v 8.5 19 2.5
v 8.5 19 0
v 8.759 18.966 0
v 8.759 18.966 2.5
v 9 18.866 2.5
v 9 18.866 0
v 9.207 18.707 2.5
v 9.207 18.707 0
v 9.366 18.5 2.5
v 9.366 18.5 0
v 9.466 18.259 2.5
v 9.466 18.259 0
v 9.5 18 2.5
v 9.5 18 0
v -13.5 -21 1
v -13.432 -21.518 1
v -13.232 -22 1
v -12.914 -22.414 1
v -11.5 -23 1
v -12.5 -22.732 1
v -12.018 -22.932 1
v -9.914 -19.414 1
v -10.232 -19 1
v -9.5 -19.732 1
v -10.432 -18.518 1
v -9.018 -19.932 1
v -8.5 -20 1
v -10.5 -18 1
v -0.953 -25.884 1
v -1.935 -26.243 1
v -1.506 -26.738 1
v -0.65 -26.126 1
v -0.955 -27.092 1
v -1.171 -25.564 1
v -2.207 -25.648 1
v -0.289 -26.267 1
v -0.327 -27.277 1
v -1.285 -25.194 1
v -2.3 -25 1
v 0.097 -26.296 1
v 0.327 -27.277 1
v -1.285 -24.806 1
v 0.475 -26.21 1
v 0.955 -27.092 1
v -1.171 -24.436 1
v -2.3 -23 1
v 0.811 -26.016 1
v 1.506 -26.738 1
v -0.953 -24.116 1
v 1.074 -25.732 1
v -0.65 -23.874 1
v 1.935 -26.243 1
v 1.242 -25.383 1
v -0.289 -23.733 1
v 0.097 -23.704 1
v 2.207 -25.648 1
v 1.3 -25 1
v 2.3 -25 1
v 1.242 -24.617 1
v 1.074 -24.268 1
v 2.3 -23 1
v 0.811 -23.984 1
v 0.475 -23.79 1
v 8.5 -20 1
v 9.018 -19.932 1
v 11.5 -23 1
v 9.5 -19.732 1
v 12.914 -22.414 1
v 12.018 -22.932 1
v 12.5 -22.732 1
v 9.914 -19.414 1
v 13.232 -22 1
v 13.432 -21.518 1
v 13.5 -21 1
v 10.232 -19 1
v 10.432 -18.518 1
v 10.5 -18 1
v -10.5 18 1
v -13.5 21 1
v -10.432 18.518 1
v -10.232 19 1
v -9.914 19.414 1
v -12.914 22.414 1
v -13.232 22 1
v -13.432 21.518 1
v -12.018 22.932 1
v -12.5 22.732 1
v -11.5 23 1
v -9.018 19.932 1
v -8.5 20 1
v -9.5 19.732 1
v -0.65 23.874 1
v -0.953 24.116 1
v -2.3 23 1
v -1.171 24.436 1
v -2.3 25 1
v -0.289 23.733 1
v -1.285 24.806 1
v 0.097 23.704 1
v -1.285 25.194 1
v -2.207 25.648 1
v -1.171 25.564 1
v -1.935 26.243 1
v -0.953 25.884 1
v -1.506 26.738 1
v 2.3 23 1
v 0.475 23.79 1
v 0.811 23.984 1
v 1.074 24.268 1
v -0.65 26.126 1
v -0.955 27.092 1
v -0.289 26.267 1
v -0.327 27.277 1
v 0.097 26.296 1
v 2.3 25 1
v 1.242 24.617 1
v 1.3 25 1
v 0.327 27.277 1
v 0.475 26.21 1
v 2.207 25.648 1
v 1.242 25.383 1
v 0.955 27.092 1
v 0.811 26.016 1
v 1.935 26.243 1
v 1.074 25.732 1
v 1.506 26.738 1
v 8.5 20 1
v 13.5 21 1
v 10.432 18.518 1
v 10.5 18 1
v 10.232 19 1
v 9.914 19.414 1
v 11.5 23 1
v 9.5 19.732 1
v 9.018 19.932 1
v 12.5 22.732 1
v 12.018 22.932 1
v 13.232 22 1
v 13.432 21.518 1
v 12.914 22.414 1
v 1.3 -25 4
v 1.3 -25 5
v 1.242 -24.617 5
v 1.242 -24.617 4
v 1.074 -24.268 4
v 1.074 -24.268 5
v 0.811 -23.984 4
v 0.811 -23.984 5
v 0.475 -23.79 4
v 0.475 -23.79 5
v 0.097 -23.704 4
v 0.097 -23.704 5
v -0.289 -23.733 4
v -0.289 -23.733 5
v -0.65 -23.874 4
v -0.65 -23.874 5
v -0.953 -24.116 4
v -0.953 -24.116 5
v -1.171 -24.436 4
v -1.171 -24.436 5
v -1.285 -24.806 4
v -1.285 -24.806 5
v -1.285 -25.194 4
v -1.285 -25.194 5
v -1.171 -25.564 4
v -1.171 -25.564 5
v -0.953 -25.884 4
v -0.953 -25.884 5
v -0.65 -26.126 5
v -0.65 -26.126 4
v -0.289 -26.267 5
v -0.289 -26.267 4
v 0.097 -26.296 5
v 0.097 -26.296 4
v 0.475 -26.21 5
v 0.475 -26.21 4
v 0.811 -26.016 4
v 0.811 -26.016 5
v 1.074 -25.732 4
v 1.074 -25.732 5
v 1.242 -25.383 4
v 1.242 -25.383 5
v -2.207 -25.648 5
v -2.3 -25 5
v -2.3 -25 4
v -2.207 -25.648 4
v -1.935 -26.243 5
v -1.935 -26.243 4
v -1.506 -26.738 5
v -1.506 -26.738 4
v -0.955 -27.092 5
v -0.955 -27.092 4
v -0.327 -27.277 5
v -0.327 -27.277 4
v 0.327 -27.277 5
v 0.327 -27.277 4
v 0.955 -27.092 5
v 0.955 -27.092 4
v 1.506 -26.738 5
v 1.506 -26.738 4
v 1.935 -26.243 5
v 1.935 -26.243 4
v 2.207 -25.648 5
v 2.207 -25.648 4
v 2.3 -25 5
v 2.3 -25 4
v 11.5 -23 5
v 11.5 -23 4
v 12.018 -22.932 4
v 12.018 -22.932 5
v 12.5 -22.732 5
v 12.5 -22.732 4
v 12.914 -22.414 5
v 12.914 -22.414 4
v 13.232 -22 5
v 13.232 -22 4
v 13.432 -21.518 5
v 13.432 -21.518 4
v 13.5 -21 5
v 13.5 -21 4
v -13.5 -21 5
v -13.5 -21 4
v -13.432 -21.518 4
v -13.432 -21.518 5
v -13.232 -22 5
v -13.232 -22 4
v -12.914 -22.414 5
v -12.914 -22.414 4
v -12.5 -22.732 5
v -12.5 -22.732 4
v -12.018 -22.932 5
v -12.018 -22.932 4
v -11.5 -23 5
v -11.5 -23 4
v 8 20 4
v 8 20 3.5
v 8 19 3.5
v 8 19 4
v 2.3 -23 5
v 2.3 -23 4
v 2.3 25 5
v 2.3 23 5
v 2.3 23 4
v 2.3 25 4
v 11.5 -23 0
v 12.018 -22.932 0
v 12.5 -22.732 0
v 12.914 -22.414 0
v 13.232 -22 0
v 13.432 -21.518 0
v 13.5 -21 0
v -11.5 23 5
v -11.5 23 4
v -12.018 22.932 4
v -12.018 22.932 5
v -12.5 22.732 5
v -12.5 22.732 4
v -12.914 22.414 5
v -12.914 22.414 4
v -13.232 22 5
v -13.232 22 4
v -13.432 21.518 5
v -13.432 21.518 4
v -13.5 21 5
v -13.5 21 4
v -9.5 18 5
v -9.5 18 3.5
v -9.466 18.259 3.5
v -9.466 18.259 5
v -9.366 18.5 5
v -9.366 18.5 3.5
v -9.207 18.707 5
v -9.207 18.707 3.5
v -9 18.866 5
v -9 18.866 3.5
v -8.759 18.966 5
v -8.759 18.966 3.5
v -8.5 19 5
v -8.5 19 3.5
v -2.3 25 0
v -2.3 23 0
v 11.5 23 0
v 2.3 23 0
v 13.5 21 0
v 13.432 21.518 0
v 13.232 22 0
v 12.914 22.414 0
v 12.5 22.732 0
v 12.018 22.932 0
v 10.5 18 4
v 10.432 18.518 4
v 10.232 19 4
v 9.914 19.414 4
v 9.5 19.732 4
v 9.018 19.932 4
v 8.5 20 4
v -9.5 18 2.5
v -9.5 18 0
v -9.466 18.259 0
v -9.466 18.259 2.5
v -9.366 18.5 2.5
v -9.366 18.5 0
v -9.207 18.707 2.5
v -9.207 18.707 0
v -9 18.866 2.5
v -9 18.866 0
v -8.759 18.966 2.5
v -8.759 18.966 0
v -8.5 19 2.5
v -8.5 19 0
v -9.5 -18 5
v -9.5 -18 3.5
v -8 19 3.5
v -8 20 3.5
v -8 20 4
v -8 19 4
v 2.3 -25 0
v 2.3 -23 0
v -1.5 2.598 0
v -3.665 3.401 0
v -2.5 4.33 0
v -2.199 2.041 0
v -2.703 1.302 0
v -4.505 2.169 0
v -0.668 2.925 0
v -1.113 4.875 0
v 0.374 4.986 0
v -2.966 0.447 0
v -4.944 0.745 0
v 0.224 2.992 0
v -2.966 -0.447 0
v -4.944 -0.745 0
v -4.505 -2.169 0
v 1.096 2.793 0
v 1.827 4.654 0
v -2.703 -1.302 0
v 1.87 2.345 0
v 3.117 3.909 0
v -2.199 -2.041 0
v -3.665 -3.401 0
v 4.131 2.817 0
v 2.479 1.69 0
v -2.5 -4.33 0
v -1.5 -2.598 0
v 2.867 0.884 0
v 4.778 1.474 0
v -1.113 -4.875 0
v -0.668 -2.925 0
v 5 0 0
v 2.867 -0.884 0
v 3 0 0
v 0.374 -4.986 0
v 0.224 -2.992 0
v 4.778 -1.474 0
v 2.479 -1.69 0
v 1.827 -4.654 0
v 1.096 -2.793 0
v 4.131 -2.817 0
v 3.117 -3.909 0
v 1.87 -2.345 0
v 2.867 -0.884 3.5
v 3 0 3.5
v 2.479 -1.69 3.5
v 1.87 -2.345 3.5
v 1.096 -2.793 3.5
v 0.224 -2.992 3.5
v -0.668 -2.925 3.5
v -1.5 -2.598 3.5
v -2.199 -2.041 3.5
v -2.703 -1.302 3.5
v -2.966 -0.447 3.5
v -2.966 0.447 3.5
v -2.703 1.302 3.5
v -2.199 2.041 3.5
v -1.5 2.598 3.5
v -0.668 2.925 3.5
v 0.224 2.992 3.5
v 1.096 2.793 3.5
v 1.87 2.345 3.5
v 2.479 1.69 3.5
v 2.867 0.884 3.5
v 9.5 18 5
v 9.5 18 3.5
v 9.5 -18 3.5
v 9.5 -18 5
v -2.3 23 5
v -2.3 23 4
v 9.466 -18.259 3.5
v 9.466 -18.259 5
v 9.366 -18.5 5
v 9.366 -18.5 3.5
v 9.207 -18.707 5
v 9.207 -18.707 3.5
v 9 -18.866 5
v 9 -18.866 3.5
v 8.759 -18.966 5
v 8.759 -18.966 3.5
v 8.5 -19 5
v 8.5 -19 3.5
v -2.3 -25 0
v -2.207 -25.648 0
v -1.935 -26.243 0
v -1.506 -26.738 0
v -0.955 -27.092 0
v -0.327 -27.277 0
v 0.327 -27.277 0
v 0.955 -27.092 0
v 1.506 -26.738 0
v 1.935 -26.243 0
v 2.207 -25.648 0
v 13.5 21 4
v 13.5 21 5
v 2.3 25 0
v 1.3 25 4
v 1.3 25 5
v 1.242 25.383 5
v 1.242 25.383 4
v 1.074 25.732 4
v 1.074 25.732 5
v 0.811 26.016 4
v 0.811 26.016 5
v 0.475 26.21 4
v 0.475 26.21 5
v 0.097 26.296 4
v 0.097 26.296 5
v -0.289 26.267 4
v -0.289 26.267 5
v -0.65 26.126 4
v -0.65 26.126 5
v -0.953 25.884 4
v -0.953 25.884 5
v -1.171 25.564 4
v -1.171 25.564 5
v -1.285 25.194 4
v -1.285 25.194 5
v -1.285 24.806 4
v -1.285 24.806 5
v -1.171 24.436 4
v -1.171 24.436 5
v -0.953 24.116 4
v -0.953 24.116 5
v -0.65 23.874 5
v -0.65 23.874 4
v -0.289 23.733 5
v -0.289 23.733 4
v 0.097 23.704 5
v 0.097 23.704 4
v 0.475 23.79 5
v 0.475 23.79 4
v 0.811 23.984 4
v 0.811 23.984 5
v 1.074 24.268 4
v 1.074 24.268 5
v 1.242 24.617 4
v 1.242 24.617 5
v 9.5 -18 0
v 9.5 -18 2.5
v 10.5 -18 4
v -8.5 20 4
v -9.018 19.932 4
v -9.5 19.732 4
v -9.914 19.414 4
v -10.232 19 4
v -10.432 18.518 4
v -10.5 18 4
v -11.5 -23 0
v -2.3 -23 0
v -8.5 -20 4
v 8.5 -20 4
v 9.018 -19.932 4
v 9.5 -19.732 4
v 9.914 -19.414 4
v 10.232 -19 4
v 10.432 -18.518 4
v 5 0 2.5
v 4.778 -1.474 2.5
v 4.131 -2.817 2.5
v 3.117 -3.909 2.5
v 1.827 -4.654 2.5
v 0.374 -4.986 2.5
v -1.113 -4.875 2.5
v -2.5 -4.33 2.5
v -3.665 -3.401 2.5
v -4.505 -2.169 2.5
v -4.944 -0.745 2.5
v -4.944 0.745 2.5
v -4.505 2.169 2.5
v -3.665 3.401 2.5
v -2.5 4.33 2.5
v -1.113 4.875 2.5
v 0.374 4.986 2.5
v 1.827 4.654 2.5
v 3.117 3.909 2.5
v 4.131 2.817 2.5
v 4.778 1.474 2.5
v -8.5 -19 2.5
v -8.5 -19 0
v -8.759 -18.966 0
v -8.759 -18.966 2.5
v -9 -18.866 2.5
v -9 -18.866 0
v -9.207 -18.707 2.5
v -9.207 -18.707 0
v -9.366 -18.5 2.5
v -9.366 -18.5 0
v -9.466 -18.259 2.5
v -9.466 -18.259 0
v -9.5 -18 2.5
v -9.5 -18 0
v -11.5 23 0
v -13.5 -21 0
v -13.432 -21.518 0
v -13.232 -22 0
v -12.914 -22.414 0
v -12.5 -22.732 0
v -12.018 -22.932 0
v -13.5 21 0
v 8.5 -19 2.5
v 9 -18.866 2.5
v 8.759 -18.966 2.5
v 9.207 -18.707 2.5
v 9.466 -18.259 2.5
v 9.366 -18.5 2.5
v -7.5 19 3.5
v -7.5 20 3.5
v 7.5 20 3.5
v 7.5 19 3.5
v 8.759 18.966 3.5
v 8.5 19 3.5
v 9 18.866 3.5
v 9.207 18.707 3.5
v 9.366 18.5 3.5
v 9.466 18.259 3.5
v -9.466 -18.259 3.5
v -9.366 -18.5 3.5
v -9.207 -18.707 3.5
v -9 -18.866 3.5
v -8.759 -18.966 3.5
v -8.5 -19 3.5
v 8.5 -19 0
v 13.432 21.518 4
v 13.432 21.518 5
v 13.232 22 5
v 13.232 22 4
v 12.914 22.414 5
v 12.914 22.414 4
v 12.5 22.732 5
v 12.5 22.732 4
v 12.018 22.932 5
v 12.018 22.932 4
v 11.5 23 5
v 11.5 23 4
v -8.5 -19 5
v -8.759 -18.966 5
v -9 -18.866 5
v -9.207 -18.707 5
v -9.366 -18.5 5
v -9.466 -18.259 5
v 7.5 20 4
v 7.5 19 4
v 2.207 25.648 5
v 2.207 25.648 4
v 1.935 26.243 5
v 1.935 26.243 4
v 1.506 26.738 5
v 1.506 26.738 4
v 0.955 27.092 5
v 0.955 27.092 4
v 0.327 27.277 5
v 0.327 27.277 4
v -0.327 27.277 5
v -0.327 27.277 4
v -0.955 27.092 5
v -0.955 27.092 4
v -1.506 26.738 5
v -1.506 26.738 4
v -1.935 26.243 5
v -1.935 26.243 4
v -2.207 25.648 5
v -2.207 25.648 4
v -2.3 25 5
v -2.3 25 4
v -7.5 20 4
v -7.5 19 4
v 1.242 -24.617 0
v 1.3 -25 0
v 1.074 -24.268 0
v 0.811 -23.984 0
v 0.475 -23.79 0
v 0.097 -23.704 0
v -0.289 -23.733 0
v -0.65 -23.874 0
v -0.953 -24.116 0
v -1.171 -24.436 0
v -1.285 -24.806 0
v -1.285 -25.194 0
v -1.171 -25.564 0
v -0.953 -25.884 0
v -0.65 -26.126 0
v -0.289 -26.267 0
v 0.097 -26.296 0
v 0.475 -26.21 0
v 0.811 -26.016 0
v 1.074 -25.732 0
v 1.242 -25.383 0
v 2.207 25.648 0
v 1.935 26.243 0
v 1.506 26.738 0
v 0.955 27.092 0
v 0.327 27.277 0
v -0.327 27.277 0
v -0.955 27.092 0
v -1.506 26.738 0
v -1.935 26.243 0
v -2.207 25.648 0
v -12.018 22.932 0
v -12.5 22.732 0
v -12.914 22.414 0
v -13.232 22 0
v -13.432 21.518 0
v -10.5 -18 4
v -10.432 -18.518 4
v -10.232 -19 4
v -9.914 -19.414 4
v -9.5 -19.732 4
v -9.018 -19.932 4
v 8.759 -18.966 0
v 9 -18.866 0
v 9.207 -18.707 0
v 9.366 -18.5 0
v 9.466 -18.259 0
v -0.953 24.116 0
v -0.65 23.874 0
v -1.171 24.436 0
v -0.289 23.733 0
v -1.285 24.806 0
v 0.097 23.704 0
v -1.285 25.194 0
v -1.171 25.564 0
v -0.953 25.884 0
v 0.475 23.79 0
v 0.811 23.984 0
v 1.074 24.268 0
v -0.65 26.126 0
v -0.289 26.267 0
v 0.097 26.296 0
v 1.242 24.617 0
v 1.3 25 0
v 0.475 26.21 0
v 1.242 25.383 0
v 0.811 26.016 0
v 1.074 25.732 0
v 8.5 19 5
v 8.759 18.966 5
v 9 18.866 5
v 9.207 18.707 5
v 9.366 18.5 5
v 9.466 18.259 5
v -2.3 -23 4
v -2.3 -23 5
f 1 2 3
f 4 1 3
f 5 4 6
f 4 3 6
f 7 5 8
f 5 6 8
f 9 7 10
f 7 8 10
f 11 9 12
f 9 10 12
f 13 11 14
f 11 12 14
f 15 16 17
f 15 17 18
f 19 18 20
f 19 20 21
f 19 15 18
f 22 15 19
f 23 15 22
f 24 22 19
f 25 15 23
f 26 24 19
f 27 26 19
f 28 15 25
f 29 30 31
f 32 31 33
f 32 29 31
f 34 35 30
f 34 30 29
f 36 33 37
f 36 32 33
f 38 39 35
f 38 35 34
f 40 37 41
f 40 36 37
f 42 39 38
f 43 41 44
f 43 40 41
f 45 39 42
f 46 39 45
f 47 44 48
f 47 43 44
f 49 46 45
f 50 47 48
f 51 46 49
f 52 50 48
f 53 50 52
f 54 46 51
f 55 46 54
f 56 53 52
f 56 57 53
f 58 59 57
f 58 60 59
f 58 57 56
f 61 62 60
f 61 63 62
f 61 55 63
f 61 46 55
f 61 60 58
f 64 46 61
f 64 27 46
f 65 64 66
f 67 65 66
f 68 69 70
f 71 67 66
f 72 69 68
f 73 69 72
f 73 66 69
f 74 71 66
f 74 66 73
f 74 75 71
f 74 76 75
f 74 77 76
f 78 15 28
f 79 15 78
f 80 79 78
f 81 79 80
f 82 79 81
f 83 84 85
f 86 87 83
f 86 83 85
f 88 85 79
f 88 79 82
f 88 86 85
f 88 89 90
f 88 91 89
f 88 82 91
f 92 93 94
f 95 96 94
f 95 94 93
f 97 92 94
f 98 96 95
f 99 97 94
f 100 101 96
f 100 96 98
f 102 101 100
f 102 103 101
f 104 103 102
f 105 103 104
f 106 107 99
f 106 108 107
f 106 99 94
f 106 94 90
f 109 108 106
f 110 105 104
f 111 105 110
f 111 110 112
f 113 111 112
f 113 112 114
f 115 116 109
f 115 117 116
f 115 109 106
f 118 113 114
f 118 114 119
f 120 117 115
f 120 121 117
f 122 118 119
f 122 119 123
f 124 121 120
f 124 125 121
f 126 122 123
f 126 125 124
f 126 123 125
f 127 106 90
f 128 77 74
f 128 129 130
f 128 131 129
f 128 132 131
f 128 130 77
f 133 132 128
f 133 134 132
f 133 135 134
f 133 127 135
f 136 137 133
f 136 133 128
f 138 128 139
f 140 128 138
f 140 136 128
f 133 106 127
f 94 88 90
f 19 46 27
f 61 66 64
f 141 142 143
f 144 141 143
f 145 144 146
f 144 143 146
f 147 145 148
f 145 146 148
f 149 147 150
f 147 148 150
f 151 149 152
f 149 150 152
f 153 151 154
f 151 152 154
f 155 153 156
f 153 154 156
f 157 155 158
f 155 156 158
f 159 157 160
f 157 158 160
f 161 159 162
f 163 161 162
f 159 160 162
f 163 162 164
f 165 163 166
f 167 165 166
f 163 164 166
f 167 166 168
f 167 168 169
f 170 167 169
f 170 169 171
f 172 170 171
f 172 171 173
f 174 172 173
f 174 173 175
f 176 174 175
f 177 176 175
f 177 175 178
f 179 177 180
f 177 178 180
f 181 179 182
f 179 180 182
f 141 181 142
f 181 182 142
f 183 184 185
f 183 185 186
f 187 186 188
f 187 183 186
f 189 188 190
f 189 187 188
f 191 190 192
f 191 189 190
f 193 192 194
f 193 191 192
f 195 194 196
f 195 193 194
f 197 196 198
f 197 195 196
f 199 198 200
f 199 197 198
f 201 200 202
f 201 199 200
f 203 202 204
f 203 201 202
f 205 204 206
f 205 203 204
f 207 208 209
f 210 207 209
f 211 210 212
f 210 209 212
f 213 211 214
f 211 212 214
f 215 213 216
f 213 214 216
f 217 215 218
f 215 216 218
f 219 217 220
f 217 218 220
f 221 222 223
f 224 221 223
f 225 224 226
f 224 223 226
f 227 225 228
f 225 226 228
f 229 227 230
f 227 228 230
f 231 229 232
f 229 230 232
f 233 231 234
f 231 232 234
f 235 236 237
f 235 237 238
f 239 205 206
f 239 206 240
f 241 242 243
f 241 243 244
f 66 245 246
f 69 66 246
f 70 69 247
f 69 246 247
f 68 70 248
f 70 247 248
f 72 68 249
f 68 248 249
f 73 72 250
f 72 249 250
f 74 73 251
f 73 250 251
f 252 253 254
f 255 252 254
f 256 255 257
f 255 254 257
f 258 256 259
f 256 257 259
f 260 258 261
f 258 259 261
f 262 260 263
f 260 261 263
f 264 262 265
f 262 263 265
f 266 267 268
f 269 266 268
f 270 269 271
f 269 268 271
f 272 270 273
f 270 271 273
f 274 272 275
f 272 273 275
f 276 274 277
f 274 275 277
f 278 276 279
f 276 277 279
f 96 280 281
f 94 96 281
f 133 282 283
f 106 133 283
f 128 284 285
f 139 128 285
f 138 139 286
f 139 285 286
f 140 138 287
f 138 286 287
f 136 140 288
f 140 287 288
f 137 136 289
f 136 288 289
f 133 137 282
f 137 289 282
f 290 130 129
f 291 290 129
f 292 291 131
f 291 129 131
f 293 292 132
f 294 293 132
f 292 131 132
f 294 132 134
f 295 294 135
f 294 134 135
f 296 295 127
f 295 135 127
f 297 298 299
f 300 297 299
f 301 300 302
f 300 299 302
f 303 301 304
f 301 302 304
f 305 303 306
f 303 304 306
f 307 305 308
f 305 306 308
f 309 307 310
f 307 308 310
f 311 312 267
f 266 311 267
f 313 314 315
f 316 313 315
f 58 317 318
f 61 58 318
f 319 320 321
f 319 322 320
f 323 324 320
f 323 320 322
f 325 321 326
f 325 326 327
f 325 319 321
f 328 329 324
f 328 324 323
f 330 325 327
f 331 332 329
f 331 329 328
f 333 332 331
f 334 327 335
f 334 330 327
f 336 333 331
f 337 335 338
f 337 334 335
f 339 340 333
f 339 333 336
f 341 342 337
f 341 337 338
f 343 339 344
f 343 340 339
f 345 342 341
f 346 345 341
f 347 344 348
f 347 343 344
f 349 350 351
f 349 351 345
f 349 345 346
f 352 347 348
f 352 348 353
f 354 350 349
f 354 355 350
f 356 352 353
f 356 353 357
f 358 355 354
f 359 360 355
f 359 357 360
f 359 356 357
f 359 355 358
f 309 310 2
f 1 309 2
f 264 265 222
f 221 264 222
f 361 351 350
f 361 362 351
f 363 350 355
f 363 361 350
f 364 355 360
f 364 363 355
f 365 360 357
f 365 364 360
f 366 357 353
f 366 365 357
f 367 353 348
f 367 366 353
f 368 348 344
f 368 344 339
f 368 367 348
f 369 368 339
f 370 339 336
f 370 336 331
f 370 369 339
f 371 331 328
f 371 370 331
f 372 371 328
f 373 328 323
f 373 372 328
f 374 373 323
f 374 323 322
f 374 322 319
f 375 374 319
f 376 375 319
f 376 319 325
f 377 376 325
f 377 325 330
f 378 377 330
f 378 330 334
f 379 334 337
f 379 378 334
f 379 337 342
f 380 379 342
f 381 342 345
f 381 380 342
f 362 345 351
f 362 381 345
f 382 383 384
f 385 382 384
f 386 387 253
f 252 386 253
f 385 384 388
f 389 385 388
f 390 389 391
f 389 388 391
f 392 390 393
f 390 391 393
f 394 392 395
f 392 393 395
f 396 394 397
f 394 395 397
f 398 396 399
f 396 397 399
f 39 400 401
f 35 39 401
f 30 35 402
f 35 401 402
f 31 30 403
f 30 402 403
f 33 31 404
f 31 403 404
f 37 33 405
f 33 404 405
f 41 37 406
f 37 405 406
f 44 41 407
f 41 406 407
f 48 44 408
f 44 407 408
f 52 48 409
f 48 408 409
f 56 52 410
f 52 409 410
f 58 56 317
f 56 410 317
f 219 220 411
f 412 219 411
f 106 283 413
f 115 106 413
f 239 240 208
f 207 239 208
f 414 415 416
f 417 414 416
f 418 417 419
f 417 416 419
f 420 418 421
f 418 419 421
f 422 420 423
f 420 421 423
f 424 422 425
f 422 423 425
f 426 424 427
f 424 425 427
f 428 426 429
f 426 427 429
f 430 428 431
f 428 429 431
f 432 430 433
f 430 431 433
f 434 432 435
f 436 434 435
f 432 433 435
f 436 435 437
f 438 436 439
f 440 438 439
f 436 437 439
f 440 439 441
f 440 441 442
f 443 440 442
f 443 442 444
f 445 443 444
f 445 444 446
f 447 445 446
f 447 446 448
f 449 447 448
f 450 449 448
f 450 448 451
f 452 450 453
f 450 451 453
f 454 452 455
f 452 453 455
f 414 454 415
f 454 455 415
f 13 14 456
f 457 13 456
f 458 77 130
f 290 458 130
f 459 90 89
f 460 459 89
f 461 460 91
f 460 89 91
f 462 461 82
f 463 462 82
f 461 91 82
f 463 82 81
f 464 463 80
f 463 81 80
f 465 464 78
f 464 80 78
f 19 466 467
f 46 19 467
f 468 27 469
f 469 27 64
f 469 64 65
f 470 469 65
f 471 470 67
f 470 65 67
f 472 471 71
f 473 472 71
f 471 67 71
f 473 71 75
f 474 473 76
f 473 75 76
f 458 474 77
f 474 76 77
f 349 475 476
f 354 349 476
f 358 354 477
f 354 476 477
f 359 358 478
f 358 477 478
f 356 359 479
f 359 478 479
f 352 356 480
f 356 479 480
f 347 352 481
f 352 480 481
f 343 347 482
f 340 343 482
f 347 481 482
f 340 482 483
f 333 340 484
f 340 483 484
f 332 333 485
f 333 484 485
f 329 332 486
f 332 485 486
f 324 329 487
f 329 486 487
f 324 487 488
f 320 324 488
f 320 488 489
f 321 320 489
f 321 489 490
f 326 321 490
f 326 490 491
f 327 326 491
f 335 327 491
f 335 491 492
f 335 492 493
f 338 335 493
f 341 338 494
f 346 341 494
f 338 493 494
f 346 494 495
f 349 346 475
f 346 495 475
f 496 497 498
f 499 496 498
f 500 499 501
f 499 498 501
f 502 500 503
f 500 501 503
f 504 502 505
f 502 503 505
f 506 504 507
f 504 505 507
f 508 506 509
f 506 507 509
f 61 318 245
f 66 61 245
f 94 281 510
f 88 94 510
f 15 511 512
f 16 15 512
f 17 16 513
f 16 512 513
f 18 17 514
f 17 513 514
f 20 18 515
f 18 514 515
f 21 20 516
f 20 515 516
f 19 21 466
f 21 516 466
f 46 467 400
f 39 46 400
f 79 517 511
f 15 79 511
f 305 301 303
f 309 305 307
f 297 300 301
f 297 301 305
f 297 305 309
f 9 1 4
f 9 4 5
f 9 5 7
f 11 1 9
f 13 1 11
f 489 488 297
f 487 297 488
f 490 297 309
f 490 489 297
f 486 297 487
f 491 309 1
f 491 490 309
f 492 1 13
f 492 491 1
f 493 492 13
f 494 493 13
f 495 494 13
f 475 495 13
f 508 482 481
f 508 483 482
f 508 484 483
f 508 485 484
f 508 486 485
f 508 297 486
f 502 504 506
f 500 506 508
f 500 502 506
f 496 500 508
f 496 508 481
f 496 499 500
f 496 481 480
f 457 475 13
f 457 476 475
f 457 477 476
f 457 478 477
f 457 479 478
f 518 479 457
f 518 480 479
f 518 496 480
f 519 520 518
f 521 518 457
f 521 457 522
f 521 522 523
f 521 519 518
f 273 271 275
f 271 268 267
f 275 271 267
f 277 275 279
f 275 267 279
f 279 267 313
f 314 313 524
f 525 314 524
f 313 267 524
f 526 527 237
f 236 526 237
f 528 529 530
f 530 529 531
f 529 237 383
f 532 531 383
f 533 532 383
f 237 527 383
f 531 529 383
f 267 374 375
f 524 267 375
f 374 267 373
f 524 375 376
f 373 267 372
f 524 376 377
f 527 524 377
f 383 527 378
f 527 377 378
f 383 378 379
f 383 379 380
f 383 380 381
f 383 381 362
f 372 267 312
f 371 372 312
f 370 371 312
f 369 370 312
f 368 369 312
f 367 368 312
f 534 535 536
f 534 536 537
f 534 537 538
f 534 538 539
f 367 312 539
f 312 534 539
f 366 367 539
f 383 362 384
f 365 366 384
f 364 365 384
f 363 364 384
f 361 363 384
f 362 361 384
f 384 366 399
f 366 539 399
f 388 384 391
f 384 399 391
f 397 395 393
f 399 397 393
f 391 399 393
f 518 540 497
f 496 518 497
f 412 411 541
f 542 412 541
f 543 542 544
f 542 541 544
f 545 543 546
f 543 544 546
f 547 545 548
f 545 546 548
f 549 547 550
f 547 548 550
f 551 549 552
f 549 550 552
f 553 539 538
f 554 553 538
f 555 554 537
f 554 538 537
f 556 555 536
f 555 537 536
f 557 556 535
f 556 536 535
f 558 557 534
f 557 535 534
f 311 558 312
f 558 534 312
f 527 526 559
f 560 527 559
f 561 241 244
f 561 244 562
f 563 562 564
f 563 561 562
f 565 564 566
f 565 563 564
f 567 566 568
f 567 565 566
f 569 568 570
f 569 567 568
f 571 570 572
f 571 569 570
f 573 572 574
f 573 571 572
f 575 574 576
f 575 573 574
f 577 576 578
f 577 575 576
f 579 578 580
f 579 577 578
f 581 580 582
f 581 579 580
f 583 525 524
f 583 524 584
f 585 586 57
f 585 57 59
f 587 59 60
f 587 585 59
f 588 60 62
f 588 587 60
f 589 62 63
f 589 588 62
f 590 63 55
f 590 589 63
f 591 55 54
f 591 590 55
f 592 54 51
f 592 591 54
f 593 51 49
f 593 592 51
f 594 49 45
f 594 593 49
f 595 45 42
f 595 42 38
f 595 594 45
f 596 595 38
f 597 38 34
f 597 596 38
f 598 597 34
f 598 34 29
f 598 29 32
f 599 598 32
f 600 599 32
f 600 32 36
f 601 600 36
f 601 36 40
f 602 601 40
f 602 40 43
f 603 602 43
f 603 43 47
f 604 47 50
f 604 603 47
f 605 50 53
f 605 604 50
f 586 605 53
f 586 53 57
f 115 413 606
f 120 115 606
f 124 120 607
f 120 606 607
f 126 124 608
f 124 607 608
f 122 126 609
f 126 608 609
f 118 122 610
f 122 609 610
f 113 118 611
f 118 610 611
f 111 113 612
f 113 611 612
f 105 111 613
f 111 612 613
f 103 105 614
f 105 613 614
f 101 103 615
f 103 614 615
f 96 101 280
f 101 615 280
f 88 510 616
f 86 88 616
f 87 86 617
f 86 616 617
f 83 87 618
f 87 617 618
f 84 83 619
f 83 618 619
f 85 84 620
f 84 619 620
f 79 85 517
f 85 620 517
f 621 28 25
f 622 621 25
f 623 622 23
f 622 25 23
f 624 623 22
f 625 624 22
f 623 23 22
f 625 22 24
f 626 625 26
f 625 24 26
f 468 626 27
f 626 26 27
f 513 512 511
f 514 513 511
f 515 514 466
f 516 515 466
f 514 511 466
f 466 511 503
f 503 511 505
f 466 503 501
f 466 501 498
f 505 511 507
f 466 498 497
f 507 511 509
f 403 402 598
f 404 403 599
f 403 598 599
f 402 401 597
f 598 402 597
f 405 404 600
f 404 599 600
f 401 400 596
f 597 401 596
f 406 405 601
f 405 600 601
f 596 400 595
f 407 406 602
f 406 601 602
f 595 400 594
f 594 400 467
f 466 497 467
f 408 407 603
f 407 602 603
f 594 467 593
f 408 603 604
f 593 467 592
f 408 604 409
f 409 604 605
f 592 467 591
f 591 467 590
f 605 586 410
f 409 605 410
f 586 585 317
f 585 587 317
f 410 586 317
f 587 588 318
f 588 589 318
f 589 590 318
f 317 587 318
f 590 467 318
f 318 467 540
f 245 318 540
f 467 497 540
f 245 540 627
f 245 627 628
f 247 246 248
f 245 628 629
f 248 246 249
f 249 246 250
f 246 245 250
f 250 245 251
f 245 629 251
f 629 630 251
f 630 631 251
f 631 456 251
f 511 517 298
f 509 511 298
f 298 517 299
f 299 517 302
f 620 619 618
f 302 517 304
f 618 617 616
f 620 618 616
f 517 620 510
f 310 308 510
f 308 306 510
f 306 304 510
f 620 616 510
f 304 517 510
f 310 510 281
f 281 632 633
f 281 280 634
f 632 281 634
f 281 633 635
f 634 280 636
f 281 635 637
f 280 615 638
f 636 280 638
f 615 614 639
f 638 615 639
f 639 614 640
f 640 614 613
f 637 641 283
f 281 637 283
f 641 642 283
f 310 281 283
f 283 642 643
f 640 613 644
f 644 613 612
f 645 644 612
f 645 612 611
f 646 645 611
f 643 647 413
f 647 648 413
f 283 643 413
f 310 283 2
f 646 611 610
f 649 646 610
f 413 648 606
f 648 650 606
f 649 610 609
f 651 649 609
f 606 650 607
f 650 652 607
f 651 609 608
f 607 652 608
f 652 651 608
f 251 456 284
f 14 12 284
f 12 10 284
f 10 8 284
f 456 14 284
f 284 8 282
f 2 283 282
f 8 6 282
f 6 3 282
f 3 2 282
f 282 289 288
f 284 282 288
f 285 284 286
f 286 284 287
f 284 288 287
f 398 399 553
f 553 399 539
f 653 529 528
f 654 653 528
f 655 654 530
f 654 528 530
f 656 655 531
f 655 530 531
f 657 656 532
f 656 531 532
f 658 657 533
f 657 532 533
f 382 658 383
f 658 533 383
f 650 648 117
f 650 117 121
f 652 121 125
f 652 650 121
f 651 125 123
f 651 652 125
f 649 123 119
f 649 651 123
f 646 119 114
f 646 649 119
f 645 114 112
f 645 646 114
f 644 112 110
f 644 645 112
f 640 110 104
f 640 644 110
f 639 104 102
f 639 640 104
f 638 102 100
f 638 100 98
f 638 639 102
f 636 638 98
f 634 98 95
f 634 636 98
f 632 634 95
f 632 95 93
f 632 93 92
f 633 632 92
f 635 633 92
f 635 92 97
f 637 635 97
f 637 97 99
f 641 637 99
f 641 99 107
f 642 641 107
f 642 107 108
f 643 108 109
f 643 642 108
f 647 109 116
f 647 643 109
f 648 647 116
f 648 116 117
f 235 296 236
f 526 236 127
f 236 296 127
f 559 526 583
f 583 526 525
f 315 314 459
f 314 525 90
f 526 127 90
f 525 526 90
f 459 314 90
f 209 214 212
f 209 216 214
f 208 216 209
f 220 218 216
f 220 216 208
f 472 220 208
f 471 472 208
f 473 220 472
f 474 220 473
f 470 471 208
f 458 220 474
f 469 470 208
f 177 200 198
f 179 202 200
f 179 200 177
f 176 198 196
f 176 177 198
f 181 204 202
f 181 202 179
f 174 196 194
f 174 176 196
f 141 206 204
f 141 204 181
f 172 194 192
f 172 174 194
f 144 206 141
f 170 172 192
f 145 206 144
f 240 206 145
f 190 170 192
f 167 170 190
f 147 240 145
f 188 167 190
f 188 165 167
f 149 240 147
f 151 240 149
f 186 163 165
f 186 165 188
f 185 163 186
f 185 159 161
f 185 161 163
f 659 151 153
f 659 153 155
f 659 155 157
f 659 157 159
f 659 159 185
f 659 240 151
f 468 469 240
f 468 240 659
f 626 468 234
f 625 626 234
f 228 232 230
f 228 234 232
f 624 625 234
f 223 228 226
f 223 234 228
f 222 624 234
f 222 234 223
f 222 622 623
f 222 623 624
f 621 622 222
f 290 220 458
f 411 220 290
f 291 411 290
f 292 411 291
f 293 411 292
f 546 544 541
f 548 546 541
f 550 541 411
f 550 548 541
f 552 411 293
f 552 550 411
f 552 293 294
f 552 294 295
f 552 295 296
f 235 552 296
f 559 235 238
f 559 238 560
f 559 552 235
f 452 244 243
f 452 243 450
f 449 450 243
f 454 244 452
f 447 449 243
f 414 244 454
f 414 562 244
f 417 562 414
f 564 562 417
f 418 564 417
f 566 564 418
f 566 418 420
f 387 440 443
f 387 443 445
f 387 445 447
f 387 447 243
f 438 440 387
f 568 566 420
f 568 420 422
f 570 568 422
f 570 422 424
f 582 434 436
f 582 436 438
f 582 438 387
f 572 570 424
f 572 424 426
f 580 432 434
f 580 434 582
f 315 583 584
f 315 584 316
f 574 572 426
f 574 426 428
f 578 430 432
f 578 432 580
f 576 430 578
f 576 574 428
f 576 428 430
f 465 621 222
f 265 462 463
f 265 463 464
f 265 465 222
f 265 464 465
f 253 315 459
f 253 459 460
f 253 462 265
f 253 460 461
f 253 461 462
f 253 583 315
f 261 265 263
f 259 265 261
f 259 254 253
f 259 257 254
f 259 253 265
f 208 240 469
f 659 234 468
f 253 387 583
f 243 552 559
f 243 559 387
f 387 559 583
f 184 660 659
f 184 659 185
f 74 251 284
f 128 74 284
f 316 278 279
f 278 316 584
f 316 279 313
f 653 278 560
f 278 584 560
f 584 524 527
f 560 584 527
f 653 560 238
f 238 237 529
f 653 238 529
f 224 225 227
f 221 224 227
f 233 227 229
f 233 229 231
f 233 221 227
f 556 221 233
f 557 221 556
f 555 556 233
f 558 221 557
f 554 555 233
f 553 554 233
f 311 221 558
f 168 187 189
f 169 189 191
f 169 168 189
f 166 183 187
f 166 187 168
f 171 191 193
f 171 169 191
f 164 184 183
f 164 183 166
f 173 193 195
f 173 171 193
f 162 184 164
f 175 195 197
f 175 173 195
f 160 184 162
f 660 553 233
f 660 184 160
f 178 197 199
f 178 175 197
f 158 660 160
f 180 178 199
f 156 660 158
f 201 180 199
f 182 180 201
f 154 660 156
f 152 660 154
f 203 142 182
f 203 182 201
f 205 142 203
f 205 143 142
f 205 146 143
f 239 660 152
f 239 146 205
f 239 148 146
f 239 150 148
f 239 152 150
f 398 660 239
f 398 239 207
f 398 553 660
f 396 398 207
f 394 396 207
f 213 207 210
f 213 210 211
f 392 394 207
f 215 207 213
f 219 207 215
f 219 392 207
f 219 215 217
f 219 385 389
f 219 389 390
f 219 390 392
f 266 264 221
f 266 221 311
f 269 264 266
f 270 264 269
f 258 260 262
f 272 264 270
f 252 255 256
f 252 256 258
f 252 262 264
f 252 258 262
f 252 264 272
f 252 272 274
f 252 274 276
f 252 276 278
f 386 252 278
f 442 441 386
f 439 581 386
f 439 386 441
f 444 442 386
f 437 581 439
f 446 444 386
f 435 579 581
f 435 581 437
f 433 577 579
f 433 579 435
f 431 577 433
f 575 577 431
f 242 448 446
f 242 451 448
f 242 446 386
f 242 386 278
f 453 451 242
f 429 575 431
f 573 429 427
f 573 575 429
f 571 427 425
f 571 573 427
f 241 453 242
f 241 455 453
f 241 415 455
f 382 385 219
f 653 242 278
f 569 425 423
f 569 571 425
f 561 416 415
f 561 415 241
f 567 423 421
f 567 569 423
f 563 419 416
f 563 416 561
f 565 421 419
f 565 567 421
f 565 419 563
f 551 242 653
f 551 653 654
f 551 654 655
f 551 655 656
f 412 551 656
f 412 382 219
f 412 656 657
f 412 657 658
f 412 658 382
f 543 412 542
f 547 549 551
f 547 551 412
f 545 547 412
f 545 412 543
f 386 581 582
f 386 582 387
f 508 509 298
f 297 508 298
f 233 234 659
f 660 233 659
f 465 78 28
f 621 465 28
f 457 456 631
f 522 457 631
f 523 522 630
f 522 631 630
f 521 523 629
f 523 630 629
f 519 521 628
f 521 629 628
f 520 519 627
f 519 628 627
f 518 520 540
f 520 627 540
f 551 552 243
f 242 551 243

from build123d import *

# Parameters (mm, degrees)
F1_DEPTH  = 1
F3_DEPTH  = 3
F4_DEPTH  = 1.001
F6_DEPTH  = 1
F7_R      = 1.3
F8_DEPTH  = 1
F10_W     = 19
F10_H     = 38
F11_DEPTH = 1
F12_R     = 3
F13_DEPTH = 25
F14_R     = 5
F14_R_2   = 3
F15_DEPTH = 2.5
F16_W     = 0.5
F16_H     = 0.5
F17_DEPTH = 5


# Not quite as in the source:
# - a pattern or mirror of a feature is missing from the dataset's text; its kind, count and spacing are read off the source's solid


with BuildPart() as f1:
    # F0 (on Top) → F1 (new body)
    with BuildSketch(Plane.XY):
        with BuildLine():
            ThreePointArc((13.5, 21), (12.9142135624, 22.4142135624), (11.5, 23))
            Line((11.5, 23), (-11.5, 23))
            ThreePointArc((-11.5, 23), (-12.9142135624, 22.4142135624), (-13.5, 21))
            Line((-13.5, 21), (-13.5, -21))
            ThreePointArc((-13.5, -21), (-12.9142135624, -22.4142135624), (-11.5, -23))
            Line((-11.5, -23), (11.5, -23))
            ThreePointArc((11.5, -23), (12.9142135624, -22.4142135624), (13.5, -21))
            Line((13.5, -21), (13.5, 21))
        make_face()
    extrude(amount=F1_DEPTH)

    # F2 (on face) → F3 (join)
    with BuildSketch(Plane.XY.offset(1)):
        with BuildLine():
            ThreePointArc((10.5, 18), (9.9142135624, 19.4142135624), (8.5, 20))
            Line((8.5, 20), (-8.5, 20))
            ThreePointArc((-8.5, 20), (-9.9142135624, 19.4142135624), (-10.5, 18))
            Line((-10.5, 18), (-10.5, -18))
            ThreePointArc((-10.5, -18), (-9.9142135624, -19.4142135624), (-8.5, -20))
            Line((-8.5, -20), (8.5, -20))
            ThreePointArc((8.5, -20), (9.9142135624, -19.4142135624), (10.5, -18))
            Line((10.5, -18), (10.5, 18))
        make_face()
        with BuildLine():
            ThreePointArc((8.5, 19), (9.2071067812, 18.7071067812), (9.5, 18))
            Line((9.5, 18), (9.5, -18))
            ThreePointArc((9.5, -18), (9.2071067812, -18.7071067812), (8.5, -19))
            Line((8.5, -19), (-8.5, -19))
            ThreePointArc((-8.5, -19), (-9.2071067812, -18.7071067812), (-9.5, -18))
            Line((-9.5, -18), (-9.5, 18))
            ThreePointArc((-9.5, 18), (-9.2071067812, 18.7071067812), (-8.5, 19))
            Line((-8.5, 19), (8.5, 19))
        make_face(mode=Mode.SUBTRACT)
    extrude(amount=F3_DEPTH)

    # F4 (cut, through all): a face of the model
    f4_faces = [f1.faces().sort_by_distance(p)[0] for p in [
        (0, 0, 1),
    ]]
    extrude(f4_faces, amount=-F4_DEPTH, mode=Mode.SUBTRACT)

    # F5 (on face) → F6 (join)
    with BuildSketch(Plane.XY.offset(4)):
        with BuildLine():
            Line((13.5, -21), (13.5, 21))
            ThreePointArc((13.5, 21), (12.9142135624, 22.4142135624), (11.5, 23))
            Line((11.5, 23), (-11.5, 23))
            ThreePointArc((-11.5, 23), (-12.9142135624, 22.4142135624), (-13.5, 21))
            Line((-13.5, 21), (-13.5, -21))
            ThreePointArc((-13.5, -21), (-12.9142135624, -22.4142135624), (-11.5, -23))
            Line((-11.5, -23), (11.5, -23))
            ThreePointArc((11.5, -23), (12.9142135624, -22.4142135624), (13.5, -21))
        make_face()
        with BuildLine():
            ThreePointArc((8.5, 19), (9.2071067812, 18.7071067812), (9.5, 18))
            Line((9.5, 18), (9.5, -18))
            ThreePointArc((9.5, -18), (9.2071067812, -18.7071067812), (8.5, -19))
            Line((8.5, -19), (-8.5, -19))
            ThreePointArc((-8.5, -19), (-9.2071067812, -18.7071067812), (-9.5, -18))
            Line((-9.5, -18), (-9.5, 18))
            ThreePointArc((-9.5, 18), (-9.2071067812, 18.7071067812), (-8.5, 19))
            Line((-8.5, 19), (8.5, 19))
        make_face(mode=Mode.SUBTRACT)
    extrude(amount=F6_DEPTH)

    # F7 (on Top) → F8 (join)
    with BuildSketch(Plane.XY):
        with BuildLine():
            Line((2.3, 23), (2.3, 25))
            ThreePointArc((2.3, 25), (0, 27.3), (-2.3, 25))
            Line((-2.3, 25), (-2.3, 23))
            Line((-2.3, 23), (2.3, 23))
        make_face()
        with Locations((0, 25)):
            Circle(F7_R, mode=Mode.SUBTRACT)
        with BuildLine():
            ThreePointArc((-2.3, -25), (0, -27.3), (2.3, -25))
            Line((2.3, -25), (2.3, -23))
            Line((2.3, -23), (-2.3, -23))
            Line((-2.3, -23), (-2.3, -25))
        make_face()
        with Locations((0, -25)):
            Circle(F7_R, mode=Mode.SUBTRACT)
    f8 = extrude(amount=F8_DEPTH)

    # F8_copies: F8 across plane
    add(f8.mirror(Plane.XY.offset(2.5)))

    # F10 (on mid) → F11 (join)
    with BuildSketch(Plane(origin=(0, 0, 2.5), x_dir=(1, 0, 0), z_dir=(0, 0, -1))):
        Rectangle(F10_W, F10_H)
    extrude(amount=-F11_DEPTH)

    # F12 (on face) → F13 (cut)
    with BuildSketch(Plane.XY.offset(3.5)):
        Circle(F12_R)
    extrude(amount=-F13_DEPTH, mode=Mode.SUBTRACT)

    # F14 (on face) → F15 (join, through all)
    with BuildSketch(Plane(origin=(0, 0, 2.5), x_dir=(1, 0, 0), z_dir=(0, 0, -1))):
        Circle(F14_R)
        Circle(F14_R_2, mode=Mode.SUBTRACT)
    extrude(amount=F15_DEPTH)

    # F16 (on face) → F17 (cut)
    with BuildSketch(Plane(origin=(0, 20, 0), x_dir=(-1, 0, 0), z_dir=(0, 1, 0))):
        with Locations((-7.75, 3.75)):
            Rectangle(F16_W, F16_H)
        with Locations((7.75, 3.75)):
            Rectangle(F16_W, F16_H)
    extrude(amount=-F17_DEPTH, mode=Mode.SUBTRACT)


solid = f1.part
